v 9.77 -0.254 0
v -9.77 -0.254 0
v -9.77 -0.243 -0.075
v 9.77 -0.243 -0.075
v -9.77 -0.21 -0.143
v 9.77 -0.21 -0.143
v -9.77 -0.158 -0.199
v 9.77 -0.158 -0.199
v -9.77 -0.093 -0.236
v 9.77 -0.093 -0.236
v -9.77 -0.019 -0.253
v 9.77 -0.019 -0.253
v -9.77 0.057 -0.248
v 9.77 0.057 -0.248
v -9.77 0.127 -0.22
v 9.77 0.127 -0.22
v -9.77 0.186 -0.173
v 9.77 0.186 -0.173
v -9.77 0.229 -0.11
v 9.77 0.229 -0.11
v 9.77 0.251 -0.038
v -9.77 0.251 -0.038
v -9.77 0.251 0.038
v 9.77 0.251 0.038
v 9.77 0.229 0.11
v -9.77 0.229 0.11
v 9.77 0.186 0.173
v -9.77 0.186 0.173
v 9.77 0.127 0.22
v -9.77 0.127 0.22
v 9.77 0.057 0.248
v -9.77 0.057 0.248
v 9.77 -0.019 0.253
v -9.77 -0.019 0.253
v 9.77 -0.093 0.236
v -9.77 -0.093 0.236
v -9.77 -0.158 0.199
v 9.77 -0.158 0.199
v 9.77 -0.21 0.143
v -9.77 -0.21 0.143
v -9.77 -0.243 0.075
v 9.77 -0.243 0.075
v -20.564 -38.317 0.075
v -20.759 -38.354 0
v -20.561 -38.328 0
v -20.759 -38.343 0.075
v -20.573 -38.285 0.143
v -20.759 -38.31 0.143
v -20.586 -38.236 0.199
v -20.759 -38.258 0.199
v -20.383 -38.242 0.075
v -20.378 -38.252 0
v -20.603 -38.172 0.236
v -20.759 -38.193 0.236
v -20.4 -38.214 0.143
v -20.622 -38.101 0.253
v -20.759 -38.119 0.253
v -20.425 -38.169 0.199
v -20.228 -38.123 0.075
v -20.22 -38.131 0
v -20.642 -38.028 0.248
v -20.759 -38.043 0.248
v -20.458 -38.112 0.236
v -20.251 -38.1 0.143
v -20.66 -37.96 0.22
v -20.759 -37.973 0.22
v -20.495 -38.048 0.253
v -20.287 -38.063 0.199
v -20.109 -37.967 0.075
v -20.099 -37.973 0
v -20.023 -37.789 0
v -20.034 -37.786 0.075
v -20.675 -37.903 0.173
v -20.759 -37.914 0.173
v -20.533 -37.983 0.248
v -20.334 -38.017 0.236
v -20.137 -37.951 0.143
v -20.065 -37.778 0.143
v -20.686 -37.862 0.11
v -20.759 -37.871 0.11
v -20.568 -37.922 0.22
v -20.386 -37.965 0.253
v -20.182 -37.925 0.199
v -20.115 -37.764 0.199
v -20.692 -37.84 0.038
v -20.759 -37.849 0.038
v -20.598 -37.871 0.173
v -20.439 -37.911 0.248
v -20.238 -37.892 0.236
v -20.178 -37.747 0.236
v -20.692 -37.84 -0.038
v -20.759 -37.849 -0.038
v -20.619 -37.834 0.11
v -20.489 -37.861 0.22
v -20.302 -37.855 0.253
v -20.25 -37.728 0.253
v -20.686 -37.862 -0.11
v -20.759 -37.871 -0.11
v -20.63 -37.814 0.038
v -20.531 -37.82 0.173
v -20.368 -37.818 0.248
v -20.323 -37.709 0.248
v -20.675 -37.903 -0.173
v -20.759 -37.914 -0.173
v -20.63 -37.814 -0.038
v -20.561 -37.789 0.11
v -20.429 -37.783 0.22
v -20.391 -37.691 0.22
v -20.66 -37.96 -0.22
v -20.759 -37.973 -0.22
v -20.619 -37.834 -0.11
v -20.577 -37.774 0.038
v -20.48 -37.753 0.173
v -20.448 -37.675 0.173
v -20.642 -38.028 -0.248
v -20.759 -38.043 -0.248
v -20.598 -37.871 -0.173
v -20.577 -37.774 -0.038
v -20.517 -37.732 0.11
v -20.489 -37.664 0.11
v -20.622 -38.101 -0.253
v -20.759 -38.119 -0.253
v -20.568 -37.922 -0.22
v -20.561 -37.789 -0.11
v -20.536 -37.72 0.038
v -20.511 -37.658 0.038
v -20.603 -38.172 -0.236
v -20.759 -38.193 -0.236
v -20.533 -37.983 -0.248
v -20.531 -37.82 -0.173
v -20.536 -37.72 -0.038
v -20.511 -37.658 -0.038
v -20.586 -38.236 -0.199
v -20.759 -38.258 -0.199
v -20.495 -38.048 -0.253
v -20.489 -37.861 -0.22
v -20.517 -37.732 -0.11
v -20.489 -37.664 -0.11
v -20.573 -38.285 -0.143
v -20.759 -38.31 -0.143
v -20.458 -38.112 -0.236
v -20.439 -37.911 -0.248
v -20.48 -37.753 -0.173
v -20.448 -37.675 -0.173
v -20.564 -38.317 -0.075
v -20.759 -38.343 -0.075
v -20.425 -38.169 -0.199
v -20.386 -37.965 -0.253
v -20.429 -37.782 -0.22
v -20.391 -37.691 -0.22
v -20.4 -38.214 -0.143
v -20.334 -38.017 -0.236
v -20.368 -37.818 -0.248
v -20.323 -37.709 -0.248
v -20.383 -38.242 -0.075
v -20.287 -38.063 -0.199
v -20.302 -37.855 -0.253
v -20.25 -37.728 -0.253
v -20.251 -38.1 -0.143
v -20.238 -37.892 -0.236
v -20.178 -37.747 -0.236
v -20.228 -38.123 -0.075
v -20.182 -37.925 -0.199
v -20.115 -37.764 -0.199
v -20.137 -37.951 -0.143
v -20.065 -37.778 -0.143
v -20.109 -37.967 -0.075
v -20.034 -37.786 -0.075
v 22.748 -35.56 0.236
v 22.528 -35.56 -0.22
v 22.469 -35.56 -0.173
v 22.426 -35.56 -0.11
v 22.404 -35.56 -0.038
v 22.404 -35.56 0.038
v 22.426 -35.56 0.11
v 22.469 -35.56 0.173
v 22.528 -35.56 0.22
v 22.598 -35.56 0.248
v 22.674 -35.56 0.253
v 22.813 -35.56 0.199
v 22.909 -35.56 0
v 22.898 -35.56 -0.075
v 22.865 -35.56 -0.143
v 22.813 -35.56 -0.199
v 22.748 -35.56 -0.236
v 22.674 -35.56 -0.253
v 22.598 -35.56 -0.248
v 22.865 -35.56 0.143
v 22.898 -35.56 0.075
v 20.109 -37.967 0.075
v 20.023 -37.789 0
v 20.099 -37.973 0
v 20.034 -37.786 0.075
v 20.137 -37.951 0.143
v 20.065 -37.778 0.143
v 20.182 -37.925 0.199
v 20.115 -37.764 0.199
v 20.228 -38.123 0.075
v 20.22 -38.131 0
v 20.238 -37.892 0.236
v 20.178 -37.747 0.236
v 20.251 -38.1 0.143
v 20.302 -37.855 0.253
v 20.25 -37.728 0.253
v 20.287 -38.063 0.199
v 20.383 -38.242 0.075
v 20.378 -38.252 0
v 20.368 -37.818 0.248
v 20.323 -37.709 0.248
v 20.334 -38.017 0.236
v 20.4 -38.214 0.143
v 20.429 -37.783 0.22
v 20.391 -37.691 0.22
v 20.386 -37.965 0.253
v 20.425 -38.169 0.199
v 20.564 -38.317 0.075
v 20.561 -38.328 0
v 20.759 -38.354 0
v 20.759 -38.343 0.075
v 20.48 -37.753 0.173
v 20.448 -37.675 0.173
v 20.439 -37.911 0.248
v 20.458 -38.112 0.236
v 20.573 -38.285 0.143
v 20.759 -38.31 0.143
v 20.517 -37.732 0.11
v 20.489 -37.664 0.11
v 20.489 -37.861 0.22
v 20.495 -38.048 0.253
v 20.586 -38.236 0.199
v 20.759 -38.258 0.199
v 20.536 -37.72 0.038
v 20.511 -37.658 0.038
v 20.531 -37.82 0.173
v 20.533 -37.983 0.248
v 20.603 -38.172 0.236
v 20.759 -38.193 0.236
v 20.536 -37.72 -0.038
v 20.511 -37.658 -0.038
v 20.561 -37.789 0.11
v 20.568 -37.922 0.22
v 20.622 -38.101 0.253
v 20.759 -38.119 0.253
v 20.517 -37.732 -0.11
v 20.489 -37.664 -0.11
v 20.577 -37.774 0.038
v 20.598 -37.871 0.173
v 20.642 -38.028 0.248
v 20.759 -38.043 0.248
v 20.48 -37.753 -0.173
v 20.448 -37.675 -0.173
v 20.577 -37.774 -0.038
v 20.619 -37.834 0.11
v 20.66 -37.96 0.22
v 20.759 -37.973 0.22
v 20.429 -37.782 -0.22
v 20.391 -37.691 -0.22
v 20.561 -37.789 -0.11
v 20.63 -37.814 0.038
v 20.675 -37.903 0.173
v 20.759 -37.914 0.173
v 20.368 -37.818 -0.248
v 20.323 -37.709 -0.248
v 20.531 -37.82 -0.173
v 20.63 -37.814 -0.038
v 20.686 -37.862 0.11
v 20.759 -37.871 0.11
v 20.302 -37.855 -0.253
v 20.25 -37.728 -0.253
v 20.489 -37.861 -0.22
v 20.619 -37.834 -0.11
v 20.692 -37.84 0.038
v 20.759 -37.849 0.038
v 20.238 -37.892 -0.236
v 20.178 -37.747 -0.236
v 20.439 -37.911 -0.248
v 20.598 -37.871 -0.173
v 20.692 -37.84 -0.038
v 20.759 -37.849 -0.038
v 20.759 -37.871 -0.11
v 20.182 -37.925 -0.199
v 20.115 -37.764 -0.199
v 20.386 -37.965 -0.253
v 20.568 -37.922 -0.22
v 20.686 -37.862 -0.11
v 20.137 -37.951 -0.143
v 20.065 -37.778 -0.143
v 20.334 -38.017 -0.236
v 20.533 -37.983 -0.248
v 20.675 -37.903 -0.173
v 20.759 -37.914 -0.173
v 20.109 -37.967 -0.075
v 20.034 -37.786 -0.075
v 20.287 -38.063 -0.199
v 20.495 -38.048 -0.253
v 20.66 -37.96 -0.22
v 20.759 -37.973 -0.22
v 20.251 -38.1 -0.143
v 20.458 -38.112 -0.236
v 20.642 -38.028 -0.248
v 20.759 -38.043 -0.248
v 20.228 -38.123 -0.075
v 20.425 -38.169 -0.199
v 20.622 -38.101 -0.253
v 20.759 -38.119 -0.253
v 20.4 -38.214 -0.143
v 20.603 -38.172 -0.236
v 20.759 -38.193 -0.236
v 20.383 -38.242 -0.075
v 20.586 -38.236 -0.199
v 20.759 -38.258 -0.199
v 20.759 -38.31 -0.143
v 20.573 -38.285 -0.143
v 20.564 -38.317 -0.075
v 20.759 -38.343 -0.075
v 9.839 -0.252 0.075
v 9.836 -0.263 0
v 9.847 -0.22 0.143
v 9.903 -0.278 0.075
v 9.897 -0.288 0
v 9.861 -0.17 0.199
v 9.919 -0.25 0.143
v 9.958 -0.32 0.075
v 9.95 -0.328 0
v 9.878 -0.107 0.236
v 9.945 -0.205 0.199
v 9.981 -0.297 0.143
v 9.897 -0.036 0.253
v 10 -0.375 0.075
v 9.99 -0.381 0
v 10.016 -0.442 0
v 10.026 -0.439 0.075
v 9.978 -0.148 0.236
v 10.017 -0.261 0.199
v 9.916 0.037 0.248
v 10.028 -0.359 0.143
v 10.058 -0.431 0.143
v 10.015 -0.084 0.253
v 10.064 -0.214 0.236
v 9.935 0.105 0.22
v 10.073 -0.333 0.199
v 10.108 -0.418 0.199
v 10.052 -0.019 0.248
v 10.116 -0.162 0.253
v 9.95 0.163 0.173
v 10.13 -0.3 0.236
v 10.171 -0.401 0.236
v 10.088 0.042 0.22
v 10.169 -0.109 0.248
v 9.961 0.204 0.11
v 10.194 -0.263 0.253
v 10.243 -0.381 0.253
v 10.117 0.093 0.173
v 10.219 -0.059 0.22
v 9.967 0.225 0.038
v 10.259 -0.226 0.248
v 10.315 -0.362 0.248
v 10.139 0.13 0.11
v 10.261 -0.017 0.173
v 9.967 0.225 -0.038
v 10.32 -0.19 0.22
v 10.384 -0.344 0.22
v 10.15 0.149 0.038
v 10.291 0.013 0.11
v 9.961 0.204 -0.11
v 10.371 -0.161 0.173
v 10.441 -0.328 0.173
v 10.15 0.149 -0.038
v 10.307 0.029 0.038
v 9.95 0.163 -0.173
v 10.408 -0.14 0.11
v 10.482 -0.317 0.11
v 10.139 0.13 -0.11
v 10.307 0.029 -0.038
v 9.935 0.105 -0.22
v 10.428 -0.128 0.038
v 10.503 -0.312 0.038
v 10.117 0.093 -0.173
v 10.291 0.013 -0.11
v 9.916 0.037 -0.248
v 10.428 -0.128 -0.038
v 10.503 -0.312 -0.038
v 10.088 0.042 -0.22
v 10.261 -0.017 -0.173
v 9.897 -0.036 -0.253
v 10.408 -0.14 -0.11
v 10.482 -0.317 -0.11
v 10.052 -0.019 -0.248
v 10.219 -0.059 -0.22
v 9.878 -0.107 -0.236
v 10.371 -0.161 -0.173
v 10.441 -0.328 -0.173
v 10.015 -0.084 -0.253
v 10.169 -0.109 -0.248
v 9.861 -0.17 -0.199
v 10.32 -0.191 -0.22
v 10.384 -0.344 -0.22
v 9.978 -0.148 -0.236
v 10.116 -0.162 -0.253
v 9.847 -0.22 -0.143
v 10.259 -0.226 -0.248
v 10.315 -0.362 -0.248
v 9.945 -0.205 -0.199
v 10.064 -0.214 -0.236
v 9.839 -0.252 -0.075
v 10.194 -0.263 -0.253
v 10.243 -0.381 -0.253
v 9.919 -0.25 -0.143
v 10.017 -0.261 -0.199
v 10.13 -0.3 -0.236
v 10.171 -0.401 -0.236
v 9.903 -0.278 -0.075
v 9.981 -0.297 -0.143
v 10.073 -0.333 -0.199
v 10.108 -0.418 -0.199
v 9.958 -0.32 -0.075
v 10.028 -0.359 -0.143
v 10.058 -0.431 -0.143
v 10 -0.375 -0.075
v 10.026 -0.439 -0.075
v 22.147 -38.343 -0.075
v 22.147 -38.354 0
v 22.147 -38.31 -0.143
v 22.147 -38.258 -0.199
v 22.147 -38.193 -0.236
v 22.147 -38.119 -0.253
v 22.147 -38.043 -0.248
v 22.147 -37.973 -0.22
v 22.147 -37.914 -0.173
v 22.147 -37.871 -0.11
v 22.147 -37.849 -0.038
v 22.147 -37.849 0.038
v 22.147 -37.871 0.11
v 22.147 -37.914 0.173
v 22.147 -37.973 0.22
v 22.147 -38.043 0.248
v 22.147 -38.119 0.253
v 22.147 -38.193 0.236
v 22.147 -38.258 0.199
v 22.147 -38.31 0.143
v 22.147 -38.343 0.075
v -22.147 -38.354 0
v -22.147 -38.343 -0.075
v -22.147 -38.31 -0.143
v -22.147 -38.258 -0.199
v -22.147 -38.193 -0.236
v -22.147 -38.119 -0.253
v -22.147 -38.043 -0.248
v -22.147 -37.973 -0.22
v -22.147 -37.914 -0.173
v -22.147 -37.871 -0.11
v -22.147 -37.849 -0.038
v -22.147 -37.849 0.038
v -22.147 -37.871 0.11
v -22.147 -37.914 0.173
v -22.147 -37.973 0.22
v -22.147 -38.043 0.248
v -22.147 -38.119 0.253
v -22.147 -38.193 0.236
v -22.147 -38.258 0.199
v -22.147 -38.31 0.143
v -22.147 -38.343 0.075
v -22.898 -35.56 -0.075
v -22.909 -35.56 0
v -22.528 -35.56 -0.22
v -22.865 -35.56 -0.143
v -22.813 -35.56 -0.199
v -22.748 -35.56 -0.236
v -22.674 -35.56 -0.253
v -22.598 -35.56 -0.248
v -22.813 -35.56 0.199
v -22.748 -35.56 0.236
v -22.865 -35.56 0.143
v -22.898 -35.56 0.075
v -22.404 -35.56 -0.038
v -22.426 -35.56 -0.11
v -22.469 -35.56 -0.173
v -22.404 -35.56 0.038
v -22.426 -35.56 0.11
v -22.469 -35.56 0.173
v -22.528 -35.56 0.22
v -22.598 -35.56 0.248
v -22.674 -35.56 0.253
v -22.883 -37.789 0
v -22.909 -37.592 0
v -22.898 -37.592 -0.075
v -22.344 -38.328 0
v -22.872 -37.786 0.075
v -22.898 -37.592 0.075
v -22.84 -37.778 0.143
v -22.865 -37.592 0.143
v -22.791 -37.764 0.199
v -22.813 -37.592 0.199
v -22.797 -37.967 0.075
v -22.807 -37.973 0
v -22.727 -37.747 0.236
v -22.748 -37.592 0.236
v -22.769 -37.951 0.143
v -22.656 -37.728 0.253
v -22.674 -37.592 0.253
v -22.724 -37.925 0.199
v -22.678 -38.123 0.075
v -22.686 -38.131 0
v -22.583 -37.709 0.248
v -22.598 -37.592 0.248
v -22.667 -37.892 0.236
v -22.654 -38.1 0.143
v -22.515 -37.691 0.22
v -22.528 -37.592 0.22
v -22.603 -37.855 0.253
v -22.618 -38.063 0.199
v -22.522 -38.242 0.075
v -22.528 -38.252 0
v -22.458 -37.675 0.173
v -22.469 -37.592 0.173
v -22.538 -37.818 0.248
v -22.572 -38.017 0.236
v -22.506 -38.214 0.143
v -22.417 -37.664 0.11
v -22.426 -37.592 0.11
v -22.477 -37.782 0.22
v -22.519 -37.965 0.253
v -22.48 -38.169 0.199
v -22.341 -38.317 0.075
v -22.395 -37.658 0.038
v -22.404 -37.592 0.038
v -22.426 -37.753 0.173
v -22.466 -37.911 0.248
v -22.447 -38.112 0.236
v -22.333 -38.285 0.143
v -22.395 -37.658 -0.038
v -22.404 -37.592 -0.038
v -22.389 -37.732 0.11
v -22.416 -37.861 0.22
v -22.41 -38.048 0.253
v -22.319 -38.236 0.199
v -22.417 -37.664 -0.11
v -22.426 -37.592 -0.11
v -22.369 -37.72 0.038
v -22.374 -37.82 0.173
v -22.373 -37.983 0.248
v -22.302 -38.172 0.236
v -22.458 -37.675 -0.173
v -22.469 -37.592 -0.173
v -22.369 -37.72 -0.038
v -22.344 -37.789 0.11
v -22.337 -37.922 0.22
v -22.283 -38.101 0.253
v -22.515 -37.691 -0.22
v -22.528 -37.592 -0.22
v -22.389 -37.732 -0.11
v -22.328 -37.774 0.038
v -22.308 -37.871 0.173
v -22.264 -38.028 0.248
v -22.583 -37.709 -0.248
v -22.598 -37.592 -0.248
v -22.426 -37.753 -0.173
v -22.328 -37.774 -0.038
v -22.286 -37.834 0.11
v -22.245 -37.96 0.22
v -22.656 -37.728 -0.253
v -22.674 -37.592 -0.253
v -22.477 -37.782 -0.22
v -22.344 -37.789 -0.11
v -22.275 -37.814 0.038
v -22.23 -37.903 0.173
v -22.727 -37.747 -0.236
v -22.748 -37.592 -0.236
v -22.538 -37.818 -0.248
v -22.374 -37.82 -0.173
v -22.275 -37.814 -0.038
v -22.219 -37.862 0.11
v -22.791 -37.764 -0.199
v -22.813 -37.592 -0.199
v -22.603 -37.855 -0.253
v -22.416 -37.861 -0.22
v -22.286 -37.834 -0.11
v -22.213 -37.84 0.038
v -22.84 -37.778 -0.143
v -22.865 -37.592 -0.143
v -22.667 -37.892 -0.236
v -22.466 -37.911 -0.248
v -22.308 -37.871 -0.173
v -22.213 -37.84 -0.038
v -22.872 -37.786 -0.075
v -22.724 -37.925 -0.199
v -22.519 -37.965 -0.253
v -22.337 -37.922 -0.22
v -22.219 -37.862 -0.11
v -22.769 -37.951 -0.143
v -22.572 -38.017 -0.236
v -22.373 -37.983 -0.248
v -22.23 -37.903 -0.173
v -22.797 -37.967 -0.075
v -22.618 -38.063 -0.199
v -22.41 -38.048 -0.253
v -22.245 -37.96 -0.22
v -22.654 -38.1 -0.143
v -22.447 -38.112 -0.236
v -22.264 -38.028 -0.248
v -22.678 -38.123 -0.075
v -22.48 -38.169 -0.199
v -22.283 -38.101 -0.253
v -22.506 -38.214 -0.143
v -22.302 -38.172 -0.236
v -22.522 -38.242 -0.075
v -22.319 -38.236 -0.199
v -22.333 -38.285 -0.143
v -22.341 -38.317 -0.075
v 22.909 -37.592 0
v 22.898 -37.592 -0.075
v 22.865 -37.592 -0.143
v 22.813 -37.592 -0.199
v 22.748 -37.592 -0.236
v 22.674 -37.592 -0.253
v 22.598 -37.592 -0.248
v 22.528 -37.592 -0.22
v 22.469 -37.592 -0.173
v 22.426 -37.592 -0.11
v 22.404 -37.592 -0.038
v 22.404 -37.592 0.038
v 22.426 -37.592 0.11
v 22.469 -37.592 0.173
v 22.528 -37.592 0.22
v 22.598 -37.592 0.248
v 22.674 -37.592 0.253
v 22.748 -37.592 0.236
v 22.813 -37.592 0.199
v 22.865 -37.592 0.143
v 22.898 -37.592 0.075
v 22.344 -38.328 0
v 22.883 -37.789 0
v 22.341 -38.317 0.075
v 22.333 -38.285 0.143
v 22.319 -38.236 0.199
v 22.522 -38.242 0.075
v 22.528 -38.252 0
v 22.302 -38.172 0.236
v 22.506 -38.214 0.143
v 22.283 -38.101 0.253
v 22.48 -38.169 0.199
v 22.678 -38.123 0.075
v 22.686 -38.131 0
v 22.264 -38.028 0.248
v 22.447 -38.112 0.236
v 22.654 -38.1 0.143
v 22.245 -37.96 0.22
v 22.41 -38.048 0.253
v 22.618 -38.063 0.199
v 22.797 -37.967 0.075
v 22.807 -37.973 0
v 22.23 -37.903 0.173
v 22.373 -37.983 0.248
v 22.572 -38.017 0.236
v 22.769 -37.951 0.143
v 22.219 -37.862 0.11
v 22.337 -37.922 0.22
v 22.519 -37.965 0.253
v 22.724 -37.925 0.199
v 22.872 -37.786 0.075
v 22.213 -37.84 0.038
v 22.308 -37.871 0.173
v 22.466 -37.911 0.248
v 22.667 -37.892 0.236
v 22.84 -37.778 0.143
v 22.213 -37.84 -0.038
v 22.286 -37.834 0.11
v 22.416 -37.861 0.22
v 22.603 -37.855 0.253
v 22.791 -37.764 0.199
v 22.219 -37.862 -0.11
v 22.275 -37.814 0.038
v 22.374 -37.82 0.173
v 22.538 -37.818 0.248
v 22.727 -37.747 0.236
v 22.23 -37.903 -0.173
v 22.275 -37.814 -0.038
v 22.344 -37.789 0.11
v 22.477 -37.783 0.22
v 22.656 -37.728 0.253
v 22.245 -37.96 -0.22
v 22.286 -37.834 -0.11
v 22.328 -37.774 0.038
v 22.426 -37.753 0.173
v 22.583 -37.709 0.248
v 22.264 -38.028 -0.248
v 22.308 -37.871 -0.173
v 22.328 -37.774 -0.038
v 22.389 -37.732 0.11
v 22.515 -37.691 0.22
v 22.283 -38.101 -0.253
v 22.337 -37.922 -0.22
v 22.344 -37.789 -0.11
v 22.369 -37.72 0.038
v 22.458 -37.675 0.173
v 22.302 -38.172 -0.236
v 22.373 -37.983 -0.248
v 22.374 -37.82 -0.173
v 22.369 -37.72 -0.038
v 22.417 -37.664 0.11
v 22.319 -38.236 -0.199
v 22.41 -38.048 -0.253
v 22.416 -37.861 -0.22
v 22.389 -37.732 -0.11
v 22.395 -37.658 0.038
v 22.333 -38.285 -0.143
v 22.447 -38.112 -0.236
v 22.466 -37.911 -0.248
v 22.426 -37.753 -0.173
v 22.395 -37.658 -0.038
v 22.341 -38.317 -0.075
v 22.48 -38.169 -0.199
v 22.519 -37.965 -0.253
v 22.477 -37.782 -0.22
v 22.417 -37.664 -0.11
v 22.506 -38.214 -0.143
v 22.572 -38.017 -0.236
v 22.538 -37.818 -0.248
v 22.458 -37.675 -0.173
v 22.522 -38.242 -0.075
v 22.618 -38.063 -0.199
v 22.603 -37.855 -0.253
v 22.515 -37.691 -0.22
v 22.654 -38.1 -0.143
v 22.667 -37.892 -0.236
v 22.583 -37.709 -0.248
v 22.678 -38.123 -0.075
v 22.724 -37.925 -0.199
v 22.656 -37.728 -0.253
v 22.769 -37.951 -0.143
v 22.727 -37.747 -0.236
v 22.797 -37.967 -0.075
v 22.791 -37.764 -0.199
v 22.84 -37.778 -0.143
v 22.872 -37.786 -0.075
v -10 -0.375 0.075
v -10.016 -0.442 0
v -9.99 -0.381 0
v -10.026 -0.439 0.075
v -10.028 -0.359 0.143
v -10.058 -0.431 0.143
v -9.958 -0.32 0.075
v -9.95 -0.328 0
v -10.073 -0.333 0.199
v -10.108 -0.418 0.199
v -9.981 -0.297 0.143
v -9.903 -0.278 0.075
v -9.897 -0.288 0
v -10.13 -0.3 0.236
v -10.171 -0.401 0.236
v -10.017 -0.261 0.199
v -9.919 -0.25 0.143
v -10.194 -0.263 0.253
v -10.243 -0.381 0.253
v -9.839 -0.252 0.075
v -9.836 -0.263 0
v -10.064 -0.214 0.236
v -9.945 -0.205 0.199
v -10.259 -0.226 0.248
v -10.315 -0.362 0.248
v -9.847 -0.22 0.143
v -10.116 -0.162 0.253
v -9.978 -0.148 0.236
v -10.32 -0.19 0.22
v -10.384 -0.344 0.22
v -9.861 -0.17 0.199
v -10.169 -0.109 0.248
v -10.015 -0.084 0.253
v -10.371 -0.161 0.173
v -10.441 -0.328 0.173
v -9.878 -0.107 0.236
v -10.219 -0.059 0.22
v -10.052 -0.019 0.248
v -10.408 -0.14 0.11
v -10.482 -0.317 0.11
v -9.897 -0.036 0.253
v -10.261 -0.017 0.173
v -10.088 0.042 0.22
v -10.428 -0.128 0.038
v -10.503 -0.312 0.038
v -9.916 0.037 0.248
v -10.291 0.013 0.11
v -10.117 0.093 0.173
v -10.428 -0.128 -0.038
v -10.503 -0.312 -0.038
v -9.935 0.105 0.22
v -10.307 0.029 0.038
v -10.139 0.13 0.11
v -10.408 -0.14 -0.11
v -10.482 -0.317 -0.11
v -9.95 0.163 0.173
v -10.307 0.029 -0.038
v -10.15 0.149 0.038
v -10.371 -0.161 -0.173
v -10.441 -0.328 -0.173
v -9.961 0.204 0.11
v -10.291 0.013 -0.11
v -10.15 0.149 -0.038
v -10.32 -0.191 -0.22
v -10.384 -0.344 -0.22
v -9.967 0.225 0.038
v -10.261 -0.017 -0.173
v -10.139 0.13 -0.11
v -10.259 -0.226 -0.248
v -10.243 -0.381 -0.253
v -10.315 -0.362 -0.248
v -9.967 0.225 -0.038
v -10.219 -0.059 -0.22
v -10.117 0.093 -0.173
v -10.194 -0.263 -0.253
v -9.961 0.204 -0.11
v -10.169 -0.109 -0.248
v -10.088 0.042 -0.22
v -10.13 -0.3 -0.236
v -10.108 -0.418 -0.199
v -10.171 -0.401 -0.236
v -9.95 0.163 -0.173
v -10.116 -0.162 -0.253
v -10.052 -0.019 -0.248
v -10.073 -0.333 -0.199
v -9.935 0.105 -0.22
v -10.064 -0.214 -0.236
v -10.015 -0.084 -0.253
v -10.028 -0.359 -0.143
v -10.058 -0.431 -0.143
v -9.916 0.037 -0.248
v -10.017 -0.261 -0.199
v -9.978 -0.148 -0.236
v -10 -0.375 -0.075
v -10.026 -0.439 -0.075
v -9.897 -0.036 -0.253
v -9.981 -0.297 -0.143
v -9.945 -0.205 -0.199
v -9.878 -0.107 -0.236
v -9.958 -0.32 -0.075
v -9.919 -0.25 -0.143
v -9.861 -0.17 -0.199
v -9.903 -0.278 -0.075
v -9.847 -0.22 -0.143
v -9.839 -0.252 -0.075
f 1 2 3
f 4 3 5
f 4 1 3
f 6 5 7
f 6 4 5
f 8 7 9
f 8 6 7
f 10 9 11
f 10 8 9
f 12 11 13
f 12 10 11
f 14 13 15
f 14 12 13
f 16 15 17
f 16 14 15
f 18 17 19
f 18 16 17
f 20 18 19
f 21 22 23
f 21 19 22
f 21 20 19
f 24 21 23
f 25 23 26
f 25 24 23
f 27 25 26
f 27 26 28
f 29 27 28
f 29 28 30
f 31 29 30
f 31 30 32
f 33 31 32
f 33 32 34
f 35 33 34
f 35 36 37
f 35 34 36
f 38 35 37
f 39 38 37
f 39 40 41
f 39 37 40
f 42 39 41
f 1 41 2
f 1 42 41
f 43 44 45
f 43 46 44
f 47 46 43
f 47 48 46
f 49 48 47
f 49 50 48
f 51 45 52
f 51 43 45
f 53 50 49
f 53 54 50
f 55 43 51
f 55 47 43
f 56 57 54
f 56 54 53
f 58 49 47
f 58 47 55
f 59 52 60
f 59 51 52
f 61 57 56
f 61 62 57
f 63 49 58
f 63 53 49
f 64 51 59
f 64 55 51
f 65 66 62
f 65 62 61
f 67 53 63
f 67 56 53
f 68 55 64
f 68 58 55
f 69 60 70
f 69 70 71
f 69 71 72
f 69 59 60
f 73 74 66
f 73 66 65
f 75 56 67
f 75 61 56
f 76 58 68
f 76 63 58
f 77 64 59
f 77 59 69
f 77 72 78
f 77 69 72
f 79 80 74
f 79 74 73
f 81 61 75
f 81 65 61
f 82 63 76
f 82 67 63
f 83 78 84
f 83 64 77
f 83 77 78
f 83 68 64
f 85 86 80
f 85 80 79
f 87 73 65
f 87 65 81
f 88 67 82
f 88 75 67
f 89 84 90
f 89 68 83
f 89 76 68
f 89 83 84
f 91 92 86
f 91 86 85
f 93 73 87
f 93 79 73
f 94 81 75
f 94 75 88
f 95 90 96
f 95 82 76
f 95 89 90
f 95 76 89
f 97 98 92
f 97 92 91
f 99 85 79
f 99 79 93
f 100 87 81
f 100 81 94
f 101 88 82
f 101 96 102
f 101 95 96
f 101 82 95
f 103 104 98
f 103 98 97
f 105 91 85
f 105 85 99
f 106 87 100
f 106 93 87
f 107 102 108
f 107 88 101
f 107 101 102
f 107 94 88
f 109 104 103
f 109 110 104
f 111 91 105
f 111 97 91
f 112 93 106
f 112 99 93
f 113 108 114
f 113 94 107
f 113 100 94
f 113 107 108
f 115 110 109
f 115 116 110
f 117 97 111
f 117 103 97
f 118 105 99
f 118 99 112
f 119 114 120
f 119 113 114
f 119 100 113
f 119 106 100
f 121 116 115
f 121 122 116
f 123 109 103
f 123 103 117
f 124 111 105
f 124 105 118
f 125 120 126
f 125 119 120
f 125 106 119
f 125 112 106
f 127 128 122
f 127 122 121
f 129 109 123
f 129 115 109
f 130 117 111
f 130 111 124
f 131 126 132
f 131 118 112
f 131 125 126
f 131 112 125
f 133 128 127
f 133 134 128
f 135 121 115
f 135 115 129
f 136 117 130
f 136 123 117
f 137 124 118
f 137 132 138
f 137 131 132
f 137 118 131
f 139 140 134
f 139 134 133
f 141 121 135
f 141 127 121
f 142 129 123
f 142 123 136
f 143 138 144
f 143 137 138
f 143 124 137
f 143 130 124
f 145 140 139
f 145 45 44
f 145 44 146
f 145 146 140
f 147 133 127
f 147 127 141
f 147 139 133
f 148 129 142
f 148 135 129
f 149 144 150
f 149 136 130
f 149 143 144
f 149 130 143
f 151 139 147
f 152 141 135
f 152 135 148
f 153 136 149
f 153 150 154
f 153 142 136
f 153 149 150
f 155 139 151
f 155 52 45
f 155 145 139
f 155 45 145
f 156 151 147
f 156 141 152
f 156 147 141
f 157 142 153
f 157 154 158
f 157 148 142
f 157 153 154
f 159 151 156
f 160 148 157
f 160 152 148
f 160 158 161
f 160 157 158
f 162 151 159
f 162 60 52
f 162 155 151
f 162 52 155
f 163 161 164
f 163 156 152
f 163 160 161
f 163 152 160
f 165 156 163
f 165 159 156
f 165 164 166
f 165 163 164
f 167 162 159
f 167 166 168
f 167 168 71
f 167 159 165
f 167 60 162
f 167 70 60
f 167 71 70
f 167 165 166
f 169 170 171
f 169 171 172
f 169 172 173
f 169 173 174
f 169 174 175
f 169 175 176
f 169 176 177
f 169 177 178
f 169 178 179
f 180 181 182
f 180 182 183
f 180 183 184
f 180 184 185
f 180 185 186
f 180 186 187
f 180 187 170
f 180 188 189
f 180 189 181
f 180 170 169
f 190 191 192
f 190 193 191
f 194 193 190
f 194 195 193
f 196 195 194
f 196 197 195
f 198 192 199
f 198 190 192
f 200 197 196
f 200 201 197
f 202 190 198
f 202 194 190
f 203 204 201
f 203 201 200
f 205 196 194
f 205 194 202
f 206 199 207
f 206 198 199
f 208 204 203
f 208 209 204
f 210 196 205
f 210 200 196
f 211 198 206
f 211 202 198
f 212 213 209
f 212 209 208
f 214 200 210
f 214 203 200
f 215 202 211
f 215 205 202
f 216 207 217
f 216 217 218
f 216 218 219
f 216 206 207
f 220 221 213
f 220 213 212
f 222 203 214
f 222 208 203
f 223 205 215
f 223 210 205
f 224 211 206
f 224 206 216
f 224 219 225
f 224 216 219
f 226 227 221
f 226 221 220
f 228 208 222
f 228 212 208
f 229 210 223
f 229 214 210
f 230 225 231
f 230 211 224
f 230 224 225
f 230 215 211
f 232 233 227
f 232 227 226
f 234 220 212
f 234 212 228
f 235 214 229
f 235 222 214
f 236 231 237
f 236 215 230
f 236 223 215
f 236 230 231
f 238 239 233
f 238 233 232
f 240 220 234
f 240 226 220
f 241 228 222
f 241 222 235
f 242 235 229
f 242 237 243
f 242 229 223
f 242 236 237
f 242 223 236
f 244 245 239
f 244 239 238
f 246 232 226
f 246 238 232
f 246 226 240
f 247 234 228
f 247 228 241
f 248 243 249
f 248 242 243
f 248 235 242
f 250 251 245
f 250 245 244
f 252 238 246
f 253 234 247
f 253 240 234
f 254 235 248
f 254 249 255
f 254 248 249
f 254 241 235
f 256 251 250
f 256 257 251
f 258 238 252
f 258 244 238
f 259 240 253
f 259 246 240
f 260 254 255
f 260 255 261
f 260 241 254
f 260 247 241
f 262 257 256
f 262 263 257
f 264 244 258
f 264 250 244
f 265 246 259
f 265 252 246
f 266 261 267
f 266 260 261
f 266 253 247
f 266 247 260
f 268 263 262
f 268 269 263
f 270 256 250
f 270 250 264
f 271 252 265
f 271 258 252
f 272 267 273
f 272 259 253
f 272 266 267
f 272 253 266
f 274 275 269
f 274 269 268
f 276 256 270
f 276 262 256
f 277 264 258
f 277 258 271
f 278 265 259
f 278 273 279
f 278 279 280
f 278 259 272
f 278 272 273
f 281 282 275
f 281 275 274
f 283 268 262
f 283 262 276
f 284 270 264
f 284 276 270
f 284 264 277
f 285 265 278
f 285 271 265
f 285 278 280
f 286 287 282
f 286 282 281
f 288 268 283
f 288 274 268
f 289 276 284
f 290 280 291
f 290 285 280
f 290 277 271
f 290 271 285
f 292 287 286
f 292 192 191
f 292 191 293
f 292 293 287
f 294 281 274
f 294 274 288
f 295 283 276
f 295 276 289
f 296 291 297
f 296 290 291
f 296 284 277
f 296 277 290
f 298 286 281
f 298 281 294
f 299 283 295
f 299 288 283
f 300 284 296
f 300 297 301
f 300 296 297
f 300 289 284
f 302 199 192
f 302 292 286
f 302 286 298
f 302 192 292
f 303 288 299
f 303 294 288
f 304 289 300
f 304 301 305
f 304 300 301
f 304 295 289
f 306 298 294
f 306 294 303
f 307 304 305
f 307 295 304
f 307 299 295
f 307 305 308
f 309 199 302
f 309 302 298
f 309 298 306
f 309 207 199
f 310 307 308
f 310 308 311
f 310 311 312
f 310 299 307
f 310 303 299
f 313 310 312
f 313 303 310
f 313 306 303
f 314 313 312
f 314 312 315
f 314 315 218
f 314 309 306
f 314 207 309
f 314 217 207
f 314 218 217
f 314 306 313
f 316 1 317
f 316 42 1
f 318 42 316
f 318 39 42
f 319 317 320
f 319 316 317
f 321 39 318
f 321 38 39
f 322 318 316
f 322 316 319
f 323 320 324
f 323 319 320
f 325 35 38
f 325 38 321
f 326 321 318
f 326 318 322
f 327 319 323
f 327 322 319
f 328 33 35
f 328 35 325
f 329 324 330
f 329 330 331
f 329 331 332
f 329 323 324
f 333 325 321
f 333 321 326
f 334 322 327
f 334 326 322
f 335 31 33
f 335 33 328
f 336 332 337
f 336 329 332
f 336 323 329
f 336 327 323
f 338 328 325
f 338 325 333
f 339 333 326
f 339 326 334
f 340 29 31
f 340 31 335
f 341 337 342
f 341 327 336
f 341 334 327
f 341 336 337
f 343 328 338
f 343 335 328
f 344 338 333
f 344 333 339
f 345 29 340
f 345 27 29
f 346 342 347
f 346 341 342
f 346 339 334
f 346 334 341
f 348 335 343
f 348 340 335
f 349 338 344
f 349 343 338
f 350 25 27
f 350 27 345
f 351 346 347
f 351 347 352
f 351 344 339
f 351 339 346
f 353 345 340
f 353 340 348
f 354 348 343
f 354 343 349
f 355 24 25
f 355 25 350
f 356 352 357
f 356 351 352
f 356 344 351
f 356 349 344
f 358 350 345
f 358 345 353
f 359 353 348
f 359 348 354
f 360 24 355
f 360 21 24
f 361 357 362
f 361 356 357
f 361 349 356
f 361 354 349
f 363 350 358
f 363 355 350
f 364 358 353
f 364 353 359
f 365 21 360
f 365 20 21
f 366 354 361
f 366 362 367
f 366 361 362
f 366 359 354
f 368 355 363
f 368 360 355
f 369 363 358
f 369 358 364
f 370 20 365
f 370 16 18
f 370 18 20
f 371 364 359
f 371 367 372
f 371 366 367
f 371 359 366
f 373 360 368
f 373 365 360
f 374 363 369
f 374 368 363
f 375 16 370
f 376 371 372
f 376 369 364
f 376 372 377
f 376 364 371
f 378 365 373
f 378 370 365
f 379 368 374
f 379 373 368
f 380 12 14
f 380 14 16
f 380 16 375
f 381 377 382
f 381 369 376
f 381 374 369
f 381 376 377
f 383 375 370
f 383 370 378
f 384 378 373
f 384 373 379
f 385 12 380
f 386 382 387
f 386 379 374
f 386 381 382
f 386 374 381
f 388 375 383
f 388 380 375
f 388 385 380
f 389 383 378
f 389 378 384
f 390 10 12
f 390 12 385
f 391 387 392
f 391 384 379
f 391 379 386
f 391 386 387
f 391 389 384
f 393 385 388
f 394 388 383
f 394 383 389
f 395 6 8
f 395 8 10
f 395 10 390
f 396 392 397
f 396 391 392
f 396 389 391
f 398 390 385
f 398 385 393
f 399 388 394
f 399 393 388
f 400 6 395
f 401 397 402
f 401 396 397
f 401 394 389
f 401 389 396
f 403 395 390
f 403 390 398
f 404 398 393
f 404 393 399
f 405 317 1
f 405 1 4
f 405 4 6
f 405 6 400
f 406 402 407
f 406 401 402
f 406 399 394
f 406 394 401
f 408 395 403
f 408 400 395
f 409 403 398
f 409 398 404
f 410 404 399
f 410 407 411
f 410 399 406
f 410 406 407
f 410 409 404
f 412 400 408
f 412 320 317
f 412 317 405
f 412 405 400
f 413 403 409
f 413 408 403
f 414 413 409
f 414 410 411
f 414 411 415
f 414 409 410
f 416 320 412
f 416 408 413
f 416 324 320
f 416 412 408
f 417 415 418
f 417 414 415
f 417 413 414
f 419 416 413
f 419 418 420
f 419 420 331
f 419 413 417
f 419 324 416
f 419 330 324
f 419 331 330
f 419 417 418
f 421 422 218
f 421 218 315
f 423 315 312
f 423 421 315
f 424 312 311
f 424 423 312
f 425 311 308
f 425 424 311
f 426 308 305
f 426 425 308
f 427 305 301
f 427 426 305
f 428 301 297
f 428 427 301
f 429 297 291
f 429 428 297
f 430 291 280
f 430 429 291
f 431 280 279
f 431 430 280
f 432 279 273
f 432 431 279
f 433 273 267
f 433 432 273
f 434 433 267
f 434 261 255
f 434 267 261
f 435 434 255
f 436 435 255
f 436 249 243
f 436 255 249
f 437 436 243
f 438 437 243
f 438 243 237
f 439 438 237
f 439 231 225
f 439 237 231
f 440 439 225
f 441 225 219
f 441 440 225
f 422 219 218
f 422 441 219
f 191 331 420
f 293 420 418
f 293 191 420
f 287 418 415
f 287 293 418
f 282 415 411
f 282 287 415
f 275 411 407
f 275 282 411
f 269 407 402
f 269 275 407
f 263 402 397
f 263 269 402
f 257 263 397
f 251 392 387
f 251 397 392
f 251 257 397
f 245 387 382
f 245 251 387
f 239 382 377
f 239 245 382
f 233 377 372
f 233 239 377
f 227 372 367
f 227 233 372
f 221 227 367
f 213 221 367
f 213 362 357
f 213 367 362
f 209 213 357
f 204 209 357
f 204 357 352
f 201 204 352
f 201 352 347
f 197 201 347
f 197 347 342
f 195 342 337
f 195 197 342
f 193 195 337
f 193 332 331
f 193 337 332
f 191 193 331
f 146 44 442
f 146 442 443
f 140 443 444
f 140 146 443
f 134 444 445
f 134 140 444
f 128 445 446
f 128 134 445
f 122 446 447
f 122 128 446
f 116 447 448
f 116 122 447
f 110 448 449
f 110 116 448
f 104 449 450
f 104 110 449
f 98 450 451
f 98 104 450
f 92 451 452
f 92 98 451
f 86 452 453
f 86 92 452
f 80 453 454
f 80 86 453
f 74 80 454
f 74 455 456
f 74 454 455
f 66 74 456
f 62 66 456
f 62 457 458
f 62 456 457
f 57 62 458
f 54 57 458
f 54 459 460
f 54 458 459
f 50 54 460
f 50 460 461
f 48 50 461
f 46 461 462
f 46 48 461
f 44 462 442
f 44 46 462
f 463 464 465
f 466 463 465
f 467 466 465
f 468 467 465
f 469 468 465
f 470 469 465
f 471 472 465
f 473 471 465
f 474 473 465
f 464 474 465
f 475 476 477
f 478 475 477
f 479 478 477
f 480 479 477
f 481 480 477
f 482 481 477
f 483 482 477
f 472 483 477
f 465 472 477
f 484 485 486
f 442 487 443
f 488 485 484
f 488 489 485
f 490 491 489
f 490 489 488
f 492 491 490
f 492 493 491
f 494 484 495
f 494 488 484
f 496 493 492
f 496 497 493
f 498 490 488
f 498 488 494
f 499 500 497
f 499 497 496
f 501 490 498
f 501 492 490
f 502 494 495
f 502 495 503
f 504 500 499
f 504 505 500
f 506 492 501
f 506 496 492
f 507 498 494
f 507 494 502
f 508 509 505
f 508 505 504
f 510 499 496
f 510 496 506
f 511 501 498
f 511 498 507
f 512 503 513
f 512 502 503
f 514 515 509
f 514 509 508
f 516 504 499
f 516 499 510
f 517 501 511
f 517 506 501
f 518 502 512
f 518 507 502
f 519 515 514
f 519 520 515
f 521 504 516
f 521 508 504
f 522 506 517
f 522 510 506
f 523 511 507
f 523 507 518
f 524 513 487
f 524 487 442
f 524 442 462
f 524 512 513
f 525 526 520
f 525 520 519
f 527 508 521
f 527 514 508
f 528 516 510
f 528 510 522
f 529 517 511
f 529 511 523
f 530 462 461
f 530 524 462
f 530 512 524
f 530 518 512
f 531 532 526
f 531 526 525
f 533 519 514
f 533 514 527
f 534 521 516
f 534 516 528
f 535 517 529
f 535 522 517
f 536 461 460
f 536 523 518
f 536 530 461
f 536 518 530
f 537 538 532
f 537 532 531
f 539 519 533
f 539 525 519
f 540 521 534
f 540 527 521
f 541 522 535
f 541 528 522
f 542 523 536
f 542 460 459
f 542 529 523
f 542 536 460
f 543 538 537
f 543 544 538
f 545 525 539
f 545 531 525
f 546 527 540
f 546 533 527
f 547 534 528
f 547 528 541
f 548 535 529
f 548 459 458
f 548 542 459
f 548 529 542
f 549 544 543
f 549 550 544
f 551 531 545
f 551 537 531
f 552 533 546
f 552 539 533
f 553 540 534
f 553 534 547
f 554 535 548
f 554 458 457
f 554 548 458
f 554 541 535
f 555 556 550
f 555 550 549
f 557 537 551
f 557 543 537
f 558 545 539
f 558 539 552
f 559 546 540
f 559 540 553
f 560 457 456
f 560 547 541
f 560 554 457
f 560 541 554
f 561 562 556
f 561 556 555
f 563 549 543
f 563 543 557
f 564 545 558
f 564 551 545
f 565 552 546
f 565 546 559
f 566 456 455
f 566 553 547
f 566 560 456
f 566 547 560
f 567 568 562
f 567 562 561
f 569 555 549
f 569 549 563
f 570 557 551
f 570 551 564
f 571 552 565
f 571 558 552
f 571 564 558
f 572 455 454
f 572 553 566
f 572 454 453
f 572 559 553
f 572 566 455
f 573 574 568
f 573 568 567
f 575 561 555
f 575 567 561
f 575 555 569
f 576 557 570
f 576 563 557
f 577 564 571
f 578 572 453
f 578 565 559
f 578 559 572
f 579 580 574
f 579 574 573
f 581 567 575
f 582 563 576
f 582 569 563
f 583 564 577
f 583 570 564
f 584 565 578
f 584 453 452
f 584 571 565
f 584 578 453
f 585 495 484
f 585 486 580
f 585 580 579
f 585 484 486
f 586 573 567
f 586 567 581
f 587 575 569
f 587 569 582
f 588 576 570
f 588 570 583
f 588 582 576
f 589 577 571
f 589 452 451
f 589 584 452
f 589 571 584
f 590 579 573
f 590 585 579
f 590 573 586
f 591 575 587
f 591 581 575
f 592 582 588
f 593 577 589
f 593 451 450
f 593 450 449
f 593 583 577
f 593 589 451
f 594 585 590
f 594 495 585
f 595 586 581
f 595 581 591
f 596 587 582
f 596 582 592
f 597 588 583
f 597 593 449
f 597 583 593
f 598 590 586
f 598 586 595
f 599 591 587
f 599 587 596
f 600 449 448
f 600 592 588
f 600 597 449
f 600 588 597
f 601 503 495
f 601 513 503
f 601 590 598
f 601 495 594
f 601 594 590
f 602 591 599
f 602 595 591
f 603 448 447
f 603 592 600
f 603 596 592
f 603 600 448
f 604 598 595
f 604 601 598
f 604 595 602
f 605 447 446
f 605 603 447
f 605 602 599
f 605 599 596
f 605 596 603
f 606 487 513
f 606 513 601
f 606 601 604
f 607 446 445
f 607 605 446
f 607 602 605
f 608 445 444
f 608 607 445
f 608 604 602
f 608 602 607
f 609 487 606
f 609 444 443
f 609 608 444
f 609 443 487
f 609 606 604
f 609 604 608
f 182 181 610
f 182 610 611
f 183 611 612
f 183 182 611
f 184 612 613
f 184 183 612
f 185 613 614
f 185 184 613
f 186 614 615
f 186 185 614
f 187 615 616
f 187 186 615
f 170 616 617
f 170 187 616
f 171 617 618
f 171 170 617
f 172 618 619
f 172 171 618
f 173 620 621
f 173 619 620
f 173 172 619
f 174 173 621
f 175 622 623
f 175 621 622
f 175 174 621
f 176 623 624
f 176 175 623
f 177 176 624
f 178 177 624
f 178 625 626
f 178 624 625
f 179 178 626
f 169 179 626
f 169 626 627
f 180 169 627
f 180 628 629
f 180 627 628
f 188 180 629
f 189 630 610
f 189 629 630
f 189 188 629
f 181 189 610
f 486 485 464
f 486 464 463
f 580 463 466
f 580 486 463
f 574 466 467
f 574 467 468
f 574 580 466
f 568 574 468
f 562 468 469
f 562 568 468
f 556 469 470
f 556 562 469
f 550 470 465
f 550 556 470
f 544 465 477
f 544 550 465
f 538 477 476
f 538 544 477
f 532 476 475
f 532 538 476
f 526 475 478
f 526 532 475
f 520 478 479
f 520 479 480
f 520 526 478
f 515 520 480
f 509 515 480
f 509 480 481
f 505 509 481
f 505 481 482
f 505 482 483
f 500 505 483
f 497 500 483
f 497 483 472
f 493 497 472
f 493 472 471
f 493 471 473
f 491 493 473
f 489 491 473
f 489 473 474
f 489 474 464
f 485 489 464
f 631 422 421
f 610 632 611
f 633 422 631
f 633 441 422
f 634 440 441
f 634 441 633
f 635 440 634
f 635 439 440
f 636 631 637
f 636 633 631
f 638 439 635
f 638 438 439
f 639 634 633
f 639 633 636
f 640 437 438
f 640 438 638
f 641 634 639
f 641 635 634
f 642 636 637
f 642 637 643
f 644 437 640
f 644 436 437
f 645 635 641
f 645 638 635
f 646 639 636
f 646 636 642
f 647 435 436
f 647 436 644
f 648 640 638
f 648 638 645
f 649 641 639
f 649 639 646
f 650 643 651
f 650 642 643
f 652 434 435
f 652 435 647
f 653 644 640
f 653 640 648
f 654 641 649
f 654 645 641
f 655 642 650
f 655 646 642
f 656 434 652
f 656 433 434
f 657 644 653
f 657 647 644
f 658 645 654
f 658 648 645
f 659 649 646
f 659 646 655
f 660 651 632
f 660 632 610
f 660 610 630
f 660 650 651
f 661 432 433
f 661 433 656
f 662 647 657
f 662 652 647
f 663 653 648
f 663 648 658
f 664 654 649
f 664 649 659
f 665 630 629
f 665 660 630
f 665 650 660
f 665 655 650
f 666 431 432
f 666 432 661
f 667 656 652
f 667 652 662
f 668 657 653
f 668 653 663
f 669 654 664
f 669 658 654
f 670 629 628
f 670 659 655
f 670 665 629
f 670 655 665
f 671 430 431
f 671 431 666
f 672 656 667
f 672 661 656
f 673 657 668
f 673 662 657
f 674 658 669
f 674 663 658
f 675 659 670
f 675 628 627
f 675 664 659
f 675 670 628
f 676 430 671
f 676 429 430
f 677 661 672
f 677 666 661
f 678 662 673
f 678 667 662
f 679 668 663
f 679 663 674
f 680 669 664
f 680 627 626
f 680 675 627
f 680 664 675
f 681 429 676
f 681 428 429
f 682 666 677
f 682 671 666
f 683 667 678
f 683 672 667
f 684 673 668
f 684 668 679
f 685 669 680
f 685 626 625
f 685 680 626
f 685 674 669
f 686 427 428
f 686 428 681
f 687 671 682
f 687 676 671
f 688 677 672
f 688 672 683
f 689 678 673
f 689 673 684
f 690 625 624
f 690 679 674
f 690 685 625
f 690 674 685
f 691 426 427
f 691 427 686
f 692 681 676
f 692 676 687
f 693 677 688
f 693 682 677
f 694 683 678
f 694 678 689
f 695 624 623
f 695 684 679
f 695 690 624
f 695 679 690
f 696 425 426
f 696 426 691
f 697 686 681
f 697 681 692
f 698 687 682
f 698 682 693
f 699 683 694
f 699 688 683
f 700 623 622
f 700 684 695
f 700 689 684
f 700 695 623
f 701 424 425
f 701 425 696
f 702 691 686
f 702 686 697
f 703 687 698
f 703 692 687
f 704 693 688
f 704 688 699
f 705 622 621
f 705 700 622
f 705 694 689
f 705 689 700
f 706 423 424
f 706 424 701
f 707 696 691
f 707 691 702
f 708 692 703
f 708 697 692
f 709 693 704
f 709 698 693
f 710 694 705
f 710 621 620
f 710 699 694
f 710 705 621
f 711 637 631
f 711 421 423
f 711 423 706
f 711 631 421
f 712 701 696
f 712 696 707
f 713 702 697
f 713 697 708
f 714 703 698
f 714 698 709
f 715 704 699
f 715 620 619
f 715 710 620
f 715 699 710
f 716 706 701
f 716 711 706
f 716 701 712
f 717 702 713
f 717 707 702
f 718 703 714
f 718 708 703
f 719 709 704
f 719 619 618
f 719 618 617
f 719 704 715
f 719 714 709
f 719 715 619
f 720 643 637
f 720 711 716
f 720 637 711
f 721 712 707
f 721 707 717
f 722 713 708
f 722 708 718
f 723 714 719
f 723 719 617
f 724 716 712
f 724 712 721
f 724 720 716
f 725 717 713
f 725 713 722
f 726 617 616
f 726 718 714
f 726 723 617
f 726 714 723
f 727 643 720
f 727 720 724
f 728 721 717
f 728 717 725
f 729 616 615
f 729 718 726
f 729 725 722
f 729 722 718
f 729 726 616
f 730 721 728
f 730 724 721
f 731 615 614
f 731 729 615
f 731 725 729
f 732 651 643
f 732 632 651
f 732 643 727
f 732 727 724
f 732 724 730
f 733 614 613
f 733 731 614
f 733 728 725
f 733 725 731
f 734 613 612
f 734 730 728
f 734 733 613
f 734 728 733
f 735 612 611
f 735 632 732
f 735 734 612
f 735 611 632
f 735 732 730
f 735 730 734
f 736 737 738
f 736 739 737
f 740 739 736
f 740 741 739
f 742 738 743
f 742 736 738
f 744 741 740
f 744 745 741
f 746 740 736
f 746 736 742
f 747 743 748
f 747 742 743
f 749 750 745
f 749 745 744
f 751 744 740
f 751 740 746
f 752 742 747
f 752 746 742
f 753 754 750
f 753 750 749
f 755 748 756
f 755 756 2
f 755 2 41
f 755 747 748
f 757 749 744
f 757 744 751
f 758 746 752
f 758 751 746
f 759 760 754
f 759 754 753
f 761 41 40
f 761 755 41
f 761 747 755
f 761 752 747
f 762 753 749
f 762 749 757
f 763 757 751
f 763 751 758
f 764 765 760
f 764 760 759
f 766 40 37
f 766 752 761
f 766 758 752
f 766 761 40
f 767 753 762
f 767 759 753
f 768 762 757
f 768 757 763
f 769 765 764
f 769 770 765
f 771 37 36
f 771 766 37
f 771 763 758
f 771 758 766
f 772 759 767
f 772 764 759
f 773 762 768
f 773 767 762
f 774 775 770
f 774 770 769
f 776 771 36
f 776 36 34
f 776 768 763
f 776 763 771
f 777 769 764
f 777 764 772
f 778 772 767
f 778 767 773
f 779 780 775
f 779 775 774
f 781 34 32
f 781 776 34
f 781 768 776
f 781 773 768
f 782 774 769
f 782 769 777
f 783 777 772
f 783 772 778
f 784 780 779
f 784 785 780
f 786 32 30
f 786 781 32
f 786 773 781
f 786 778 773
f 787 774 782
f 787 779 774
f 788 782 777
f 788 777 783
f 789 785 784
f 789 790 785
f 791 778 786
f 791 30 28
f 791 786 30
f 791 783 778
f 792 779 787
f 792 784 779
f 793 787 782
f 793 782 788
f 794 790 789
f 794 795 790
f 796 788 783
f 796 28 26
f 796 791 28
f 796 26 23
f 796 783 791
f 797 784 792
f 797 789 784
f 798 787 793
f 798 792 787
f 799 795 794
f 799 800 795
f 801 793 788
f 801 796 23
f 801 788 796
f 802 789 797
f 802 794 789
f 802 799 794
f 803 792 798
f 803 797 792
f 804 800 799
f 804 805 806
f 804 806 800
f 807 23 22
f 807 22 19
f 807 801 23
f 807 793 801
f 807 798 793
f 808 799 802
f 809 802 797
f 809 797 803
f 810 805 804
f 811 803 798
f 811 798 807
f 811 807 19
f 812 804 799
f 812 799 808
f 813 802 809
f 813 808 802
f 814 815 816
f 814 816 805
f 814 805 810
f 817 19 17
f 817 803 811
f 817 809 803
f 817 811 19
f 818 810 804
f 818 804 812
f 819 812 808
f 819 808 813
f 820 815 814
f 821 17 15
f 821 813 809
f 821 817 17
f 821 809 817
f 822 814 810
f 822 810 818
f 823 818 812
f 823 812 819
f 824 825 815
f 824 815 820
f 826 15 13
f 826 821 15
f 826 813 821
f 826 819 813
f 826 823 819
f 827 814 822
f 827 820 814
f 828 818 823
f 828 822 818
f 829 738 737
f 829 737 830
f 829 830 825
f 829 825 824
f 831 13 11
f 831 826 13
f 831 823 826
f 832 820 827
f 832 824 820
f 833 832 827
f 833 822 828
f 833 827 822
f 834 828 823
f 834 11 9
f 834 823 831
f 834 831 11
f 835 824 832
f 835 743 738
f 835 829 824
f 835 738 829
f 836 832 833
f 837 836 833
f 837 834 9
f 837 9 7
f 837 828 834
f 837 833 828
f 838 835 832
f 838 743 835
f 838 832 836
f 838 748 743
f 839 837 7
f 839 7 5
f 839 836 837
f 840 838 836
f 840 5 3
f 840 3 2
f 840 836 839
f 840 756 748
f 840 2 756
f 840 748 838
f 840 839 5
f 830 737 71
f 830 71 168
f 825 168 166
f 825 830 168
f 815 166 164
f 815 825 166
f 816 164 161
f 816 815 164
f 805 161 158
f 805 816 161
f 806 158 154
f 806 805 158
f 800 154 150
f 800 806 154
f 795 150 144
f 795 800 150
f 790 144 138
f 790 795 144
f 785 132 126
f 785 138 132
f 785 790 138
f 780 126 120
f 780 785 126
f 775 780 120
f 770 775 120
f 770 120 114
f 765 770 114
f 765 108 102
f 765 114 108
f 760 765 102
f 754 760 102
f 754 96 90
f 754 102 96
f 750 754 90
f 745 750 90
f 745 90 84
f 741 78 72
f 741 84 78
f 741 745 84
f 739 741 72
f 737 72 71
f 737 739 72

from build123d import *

# Parameters (mm, degrees)
SWEEP1_PROFILE_R = 0.254


with BuildPart() as part:
    # Sweep1: sweep along a path in Sketch1
    with BuildLine(Plane.XY) as sweep1_path:
        Line((-22.654864232, -35.56), (-22.654864232, -37.592))
        ThreePointArc((-22.654864232, -37.592), (-22.506074476, -37.951210245), (-22.146864232, -38.1))
        Line((-22.146864232, -38.1), (-20.758666342, -38.1))
        ThreePointArc((-20.758666342, -38.1), (-20.449415536, -37.995023497), (-20.267976022, -37.723480075))
        Line((-20.267976022, -37.723480075), (-10.26088821, -0.376519925))
        ThreePointArc((-10.26088821, -0.376519925), (-10.079448696, -0.104976503), (-9.77019789, 0))
        Line((-9.77019789, 0), (9.77019789, 0))
        ThreePointArc((9.77019789, 0), (10.079448696, -0.104976503), (10.26088821, -0.376519925))
        Line((10.26088821, -0.376519925), (20.267976022, -37.723480075))
        ThreePointArc((20.267976022, -37.723480075), (20.449415536, -37.995023497), (20.758666342, -38.1))
        Line((20.758666342, -38.1), (22.146864232, -38.1))
        ThreePointArc((22.146864232, -38.1), (22.506074476, -37.951210245), (22.654864232, -37.592))
        Line((22.654864232, -37.592), (22.654864232, -35.56))
    # Sweep1 profile (on start of the path) → Sweep1 (sweep)
    with BuildSketch(Plane(origin=(-22.654864232, -35.56, 0), x_dir=(-1, 0, 0), z_dir=(0, -1, 0))):
        Circle(SWEEP1_PROFILE_R)
    sweep(path=sweep1_path.line)


solid = part.part
